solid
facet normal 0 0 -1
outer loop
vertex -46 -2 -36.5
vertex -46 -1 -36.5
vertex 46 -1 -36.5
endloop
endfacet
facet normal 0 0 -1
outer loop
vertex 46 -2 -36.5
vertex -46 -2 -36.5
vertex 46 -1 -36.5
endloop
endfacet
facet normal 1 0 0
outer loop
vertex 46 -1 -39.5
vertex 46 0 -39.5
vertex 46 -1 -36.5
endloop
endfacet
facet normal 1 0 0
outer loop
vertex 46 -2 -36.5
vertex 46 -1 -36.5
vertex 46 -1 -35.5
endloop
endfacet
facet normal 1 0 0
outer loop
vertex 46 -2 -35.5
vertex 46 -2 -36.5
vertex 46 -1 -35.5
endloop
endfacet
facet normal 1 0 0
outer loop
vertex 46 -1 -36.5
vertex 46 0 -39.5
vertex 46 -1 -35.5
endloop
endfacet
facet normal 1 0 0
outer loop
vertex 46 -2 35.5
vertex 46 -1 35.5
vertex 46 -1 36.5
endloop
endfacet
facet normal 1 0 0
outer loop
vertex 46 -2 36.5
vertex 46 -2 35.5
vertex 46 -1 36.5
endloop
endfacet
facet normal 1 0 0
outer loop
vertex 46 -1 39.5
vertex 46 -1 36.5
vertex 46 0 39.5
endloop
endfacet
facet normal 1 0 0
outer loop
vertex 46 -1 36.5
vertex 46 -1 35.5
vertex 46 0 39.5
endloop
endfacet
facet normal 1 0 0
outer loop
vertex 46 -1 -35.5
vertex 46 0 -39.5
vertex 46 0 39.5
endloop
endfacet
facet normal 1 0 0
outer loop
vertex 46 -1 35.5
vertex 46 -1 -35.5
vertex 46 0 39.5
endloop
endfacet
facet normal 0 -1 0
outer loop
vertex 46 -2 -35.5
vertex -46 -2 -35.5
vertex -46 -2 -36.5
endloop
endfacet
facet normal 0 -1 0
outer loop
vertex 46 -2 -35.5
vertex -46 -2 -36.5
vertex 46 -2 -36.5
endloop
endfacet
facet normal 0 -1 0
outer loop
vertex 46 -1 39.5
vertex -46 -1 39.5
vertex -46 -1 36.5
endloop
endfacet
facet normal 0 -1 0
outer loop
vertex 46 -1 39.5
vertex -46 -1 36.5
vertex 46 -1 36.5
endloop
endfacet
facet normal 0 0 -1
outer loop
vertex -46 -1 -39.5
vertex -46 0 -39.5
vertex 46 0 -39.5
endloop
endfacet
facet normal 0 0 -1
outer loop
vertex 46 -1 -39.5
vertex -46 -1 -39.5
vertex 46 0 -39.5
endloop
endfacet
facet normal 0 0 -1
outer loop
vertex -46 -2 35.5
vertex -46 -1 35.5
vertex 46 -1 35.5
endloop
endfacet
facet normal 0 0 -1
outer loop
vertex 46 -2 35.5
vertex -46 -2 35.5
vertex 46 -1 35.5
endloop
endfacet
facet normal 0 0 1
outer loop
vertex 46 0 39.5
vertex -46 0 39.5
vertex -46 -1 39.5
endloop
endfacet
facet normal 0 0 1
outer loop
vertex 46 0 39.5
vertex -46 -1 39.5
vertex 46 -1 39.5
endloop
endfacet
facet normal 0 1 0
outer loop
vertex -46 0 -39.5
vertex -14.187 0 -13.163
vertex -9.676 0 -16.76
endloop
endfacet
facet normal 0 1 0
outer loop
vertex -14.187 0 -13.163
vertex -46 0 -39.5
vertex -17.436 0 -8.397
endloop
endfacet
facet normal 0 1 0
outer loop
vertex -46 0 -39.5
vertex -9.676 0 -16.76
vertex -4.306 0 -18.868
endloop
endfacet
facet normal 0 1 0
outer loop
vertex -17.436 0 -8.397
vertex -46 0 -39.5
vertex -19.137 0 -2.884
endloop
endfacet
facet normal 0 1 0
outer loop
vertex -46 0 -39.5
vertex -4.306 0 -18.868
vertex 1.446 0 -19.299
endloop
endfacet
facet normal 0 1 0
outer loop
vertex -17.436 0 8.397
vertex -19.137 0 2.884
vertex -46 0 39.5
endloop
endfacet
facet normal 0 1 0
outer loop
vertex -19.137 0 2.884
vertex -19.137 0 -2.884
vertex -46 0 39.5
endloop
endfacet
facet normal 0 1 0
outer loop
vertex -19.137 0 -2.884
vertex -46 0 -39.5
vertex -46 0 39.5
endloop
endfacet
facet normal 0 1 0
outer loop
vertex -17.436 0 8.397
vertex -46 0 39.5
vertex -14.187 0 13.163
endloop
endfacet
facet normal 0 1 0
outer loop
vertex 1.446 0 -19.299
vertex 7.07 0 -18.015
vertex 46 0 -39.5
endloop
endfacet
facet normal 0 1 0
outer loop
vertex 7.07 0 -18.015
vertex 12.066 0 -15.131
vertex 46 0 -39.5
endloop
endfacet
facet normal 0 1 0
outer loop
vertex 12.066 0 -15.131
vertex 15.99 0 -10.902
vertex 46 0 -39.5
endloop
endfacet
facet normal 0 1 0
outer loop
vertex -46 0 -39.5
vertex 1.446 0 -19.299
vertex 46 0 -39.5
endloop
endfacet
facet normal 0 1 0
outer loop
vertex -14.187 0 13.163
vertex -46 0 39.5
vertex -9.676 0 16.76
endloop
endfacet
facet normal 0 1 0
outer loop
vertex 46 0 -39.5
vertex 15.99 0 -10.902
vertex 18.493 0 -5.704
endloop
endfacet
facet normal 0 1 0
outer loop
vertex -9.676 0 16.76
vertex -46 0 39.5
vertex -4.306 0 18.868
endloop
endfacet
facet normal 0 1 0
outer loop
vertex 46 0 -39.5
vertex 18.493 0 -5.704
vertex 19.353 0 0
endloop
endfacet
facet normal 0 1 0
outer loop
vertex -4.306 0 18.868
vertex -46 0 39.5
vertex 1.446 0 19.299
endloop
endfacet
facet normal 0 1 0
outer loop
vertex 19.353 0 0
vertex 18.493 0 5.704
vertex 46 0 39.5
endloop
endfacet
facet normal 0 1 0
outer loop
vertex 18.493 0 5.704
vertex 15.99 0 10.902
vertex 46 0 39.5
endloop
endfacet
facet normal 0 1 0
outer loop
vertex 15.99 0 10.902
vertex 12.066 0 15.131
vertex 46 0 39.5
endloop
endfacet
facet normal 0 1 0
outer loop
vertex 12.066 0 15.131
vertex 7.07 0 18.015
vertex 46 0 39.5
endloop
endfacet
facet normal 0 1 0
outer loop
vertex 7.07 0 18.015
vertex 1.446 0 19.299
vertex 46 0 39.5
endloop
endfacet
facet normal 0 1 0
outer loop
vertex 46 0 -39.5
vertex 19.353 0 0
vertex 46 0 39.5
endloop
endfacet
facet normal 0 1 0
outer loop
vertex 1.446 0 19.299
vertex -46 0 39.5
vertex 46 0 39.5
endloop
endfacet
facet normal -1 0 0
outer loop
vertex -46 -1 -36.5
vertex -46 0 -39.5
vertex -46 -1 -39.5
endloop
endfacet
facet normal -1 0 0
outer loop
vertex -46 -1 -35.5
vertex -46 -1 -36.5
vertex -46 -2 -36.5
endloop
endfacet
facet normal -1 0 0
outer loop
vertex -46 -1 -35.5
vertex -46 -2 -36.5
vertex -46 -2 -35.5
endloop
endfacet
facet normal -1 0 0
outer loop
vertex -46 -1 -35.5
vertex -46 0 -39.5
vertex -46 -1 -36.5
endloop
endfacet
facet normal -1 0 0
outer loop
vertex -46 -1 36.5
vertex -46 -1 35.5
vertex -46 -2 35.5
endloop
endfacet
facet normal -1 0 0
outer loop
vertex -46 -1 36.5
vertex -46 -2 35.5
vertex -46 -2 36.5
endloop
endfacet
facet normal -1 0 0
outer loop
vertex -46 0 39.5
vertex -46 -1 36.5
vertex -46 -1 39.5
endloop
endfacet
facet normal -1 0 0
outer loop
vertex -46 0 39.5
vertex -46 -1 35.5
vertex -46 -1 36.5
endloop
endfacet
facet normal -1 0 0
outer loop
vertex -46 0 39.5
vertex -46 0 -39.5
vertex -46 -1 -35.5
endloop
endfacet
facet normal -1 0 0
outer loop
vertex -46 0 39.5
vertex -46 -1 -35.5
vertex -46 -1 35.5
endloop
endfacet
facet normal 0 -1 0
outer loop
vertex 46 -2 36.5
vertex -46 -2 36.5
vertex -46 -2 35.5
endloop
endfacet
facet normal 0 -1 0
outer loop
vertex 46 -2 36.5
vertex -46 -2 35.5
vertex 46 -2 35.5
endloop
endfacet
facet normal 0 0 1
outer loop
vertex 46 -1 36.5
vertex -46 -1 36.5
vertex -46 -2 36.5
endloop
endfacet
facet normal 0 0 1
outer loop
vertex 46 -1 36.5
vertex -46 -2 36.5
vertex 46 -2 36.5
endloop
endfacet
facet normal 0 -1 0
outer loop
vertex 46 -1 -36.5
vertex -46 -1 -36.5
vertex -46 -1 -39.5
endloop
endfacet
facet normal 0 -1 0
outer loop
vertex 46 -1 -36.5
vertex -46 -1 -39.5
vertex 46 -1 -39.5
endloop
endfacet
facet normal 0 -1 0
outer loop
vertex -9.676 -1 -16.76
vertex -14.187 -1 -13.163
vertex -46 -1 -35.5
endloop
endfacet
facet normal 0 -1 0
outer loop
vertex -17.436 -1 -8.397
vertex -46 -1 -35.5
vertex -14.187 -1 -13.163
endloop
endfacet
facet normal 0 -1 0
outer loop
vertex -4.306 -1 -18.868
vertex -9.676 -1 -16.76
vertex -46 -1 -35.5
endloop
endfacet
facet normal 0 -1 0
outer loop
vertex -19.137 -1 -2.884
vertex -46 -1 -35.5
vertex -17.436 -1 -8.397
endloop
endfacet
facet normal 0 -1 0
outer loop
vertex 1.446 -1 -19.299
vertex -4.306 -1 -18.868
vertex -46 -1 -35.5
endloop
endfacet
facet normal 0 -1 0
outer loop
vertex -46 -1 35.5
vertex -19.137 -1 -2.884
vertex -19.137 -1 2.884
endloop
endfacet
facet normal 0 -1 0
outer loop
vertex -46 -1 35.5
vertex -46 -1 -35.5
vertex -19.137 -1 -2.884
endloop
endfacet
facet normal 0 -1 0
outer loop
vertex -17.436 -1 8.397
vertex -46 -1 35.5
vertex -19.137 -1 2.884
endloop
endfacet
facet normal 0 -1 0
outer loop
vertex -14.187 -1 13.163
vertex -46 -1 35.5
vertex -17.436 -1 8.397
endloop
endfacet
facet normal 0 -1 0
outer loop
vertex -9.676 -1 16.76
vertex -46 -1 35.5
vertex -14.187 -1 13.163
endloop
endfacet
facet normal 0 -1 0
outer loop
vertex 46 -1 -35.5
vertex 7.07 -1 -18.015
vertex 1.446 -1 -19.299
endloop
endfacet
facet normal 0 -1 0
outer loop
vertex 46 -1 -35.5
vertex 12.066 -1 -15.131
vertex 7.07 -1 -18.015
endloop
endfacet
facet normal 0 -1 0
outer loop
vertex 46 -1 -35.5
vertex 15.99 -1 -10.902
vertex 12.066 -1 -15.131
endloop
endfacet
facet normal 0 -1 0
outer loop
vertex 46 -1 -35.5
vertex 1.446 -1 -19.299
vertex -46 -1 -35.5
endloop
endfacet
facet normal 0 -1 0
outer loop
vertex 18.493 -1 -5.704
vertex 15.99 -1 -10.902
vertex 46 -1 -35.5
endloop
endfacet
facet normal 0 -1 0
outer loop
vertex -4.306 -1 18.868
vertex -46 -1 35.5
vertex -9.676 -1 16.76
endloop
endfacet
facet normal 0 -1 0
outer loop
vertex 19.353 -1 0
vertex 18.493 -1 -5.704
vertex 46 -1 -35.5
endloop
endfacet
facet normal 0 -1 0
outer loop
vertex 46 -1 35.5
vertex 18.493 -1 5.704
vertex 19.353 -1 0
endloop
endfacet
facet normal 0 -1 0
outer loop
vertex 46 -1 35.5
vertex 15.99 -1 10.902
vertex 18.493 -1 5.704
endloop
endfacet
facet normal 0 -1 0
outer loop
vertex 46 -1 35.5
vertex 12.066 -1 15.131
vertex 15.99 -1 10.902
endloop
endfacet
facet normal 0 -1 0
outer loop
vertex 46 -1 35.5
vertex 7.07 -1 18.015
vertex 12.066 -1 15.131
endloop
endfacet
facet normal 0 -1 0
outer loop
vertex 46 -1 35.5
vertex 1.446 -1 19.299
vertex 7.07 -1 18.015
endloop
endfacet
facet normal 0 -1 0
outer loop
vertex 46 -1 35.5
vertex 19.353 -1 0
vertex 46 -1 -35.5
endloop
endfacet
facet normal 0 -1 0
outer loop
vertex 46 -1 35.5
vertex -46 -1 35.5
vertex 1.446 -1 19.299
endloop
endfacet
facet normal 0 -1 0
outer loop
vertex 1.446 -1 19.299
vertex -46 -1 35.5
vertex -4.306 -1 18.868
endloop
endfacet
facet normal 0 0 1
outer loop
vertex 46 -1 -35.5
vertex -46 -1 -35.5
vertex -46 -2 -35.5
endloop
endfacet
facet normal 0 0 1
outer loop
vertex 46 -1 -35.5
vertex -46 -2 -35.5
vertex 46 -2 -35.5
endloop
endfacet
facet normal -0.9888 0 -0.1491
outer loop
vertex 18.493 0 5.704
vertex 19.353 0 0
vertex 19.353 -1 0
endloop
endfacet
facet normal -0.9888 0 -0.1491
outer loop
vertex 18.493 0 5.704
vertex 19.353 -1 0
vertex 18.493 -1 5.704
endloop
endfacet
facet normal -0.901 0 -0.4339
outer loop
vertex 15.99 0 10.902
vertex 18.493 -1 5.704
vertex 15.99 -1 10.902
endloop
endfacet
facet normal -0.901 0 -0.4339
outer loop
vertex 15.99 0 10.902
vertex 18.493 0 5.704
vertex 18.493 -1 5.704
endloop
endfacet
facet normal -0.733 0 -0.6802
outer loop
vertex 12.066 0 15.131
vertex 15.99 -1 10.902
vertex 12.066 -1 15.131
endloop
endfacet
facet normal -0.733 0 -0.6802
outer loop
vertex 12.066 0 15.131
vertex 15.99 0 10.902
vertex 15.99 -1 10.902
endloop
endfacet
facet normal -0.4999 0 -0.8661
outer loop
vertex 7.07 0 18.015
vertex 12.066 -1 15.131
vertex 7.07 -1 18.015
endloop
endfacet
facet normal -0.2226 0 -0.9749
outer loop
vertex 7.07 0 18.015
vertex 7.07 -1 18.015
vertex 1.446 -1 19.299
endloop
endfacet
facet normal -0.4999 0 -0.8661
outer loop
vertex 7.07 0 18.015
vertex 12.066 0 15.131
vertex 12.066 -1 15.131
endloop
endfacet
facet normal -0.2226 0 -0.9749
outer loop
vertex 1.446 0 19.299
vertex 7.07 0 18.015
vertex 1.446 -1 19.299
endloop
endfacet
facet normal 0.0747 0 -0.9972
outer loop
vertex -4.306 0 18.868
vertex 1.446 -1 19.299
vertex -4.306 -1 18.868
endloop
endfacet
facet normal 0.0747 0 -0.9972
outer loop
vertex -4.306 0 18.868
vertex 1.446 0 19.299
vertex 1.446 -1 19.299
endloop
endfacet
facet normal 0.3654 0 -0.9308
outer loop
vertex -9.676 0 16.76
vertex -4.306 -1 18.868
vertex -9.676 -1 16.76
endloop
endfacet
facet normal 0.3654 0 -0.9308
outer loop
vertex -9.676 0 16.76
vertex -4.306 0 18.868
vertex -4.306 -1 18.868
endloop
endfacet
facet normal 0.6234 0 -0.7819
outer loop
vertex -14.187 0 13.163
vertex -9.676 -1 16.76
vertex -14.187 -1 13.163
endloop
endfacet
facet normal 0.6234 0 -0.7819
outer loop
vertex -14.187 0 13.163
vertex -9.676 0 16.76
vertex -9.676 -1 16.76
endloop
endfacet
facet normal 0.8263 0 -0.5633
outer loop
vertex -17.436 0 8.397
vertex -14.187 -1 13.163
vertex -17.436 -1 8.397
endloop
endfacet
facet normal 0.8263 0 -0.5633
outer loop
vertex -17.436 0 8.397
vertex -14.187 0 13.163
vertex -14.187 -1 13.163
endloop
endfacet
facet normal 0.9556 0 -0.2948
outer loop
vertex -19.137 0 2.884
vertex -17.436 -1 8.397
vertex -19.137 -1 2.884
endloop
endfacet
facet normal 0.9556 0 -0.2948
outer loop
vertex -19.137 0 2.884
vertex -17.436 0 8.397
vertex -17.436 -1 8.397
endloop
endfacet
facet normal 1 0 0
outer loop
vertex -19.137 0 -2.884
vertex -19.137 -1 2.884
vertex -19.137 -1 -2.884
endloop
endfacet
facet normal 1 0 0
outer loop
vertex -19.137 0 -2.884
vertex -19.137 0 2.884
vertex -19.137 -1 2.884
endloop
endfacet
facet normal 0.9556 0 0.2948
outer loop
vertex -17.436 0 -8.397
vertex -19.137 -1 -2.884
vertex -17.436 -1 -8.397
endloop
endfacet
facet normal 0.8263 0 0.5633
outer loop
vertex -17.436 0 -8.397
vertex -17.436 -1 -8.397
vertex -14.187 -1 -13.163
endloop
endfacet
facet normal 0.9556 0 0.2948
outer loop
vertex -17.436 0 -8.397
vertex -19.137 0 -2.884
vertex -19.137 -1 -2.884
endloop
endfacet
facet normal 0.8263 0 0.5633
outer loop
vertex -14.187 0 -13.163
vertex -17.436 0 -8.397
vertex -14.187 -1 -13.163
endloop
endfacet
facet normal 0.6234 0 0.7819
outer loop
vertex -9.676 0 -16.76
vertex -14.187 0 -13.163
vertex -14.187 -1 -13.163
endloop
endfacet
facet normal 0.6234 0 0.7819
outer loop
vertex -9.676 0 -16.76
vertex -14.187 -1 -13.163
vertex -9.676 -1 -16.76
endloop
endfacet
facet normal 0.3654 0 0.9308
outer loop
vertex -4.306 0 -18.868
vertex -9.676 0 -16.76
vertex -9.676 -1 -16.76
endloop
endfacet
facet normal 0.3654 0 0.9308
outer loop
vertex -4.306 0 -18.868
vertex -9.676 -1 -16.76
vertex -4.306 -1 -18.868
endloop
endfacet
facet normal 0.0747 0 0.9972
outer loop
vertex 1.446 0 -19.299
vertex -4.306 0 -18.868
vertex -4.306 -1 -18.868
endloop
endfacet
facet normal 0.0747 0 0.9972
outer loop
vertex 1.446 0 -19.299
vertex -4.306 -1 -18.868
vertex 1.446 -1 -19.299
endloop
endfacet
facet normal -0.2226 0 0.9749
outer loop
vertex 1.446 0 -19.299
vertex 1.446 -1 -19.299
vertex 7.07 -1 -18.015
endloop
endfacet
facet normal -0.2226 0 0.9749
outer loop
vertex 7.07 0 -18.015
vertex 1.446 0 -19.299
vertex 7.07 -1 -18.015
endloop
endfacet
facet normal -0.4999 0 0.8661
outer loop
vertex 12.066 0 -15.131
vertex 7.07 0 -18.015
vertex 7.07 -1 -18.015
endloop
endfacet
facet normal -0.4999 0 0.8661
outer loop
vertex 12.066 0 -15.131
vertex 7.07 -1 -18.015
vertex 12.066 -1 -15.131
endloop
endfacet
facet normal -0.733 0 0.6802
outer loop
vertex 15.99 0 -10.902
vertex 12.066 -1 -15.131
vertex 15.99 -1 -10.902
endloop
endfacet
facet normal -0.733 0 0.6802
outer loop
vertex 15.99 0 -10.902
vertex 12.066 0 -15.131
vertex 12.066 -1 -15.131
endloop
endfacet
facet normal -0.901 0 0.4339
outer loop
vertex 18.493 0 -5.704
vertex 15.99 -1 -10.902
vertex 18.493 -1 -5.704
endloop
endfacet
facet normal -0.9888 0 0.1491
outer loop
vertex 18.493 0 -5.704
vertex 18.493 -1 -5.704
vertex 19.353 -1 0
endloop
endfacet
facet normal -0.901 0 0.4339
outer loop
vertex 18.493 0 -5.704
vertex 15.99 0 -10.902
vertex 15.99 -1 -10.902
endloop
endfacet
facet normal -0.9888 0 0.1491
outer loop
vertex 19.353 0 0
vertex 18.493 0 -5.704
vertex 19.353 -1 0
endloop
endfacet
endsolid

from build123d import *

# Parameters (mm, degrees)
F0_W     = 92
F0_H     = 79
F0_R     = 19.352755
F1_DEPTH = 1
F2_W     = 92
F2_H     = 1
F3_DEPTH = 1


with BuildPart() as f1:
    # F0 (on Front) → F1 (new body)
    with BuildSketch(Plane.XZ):
        Rectangle(F0_W, F0_H)
        Circle(F0_R, mode=Mode.SUBTRACT)
    extrude(amount=F1_DEPTH)

    # F2 (on face) → F3 (join)
    with BuildSketch(Plane.XZ.offset(1)):
        with Locations((0, 36)):
            Rectangle(F2_W, F2_H)
        with Locations((0, -36)):
            Rectangle(F2_W, F2_H)
    extrude(amount=F3_DEPTH)


solid = f1.part
